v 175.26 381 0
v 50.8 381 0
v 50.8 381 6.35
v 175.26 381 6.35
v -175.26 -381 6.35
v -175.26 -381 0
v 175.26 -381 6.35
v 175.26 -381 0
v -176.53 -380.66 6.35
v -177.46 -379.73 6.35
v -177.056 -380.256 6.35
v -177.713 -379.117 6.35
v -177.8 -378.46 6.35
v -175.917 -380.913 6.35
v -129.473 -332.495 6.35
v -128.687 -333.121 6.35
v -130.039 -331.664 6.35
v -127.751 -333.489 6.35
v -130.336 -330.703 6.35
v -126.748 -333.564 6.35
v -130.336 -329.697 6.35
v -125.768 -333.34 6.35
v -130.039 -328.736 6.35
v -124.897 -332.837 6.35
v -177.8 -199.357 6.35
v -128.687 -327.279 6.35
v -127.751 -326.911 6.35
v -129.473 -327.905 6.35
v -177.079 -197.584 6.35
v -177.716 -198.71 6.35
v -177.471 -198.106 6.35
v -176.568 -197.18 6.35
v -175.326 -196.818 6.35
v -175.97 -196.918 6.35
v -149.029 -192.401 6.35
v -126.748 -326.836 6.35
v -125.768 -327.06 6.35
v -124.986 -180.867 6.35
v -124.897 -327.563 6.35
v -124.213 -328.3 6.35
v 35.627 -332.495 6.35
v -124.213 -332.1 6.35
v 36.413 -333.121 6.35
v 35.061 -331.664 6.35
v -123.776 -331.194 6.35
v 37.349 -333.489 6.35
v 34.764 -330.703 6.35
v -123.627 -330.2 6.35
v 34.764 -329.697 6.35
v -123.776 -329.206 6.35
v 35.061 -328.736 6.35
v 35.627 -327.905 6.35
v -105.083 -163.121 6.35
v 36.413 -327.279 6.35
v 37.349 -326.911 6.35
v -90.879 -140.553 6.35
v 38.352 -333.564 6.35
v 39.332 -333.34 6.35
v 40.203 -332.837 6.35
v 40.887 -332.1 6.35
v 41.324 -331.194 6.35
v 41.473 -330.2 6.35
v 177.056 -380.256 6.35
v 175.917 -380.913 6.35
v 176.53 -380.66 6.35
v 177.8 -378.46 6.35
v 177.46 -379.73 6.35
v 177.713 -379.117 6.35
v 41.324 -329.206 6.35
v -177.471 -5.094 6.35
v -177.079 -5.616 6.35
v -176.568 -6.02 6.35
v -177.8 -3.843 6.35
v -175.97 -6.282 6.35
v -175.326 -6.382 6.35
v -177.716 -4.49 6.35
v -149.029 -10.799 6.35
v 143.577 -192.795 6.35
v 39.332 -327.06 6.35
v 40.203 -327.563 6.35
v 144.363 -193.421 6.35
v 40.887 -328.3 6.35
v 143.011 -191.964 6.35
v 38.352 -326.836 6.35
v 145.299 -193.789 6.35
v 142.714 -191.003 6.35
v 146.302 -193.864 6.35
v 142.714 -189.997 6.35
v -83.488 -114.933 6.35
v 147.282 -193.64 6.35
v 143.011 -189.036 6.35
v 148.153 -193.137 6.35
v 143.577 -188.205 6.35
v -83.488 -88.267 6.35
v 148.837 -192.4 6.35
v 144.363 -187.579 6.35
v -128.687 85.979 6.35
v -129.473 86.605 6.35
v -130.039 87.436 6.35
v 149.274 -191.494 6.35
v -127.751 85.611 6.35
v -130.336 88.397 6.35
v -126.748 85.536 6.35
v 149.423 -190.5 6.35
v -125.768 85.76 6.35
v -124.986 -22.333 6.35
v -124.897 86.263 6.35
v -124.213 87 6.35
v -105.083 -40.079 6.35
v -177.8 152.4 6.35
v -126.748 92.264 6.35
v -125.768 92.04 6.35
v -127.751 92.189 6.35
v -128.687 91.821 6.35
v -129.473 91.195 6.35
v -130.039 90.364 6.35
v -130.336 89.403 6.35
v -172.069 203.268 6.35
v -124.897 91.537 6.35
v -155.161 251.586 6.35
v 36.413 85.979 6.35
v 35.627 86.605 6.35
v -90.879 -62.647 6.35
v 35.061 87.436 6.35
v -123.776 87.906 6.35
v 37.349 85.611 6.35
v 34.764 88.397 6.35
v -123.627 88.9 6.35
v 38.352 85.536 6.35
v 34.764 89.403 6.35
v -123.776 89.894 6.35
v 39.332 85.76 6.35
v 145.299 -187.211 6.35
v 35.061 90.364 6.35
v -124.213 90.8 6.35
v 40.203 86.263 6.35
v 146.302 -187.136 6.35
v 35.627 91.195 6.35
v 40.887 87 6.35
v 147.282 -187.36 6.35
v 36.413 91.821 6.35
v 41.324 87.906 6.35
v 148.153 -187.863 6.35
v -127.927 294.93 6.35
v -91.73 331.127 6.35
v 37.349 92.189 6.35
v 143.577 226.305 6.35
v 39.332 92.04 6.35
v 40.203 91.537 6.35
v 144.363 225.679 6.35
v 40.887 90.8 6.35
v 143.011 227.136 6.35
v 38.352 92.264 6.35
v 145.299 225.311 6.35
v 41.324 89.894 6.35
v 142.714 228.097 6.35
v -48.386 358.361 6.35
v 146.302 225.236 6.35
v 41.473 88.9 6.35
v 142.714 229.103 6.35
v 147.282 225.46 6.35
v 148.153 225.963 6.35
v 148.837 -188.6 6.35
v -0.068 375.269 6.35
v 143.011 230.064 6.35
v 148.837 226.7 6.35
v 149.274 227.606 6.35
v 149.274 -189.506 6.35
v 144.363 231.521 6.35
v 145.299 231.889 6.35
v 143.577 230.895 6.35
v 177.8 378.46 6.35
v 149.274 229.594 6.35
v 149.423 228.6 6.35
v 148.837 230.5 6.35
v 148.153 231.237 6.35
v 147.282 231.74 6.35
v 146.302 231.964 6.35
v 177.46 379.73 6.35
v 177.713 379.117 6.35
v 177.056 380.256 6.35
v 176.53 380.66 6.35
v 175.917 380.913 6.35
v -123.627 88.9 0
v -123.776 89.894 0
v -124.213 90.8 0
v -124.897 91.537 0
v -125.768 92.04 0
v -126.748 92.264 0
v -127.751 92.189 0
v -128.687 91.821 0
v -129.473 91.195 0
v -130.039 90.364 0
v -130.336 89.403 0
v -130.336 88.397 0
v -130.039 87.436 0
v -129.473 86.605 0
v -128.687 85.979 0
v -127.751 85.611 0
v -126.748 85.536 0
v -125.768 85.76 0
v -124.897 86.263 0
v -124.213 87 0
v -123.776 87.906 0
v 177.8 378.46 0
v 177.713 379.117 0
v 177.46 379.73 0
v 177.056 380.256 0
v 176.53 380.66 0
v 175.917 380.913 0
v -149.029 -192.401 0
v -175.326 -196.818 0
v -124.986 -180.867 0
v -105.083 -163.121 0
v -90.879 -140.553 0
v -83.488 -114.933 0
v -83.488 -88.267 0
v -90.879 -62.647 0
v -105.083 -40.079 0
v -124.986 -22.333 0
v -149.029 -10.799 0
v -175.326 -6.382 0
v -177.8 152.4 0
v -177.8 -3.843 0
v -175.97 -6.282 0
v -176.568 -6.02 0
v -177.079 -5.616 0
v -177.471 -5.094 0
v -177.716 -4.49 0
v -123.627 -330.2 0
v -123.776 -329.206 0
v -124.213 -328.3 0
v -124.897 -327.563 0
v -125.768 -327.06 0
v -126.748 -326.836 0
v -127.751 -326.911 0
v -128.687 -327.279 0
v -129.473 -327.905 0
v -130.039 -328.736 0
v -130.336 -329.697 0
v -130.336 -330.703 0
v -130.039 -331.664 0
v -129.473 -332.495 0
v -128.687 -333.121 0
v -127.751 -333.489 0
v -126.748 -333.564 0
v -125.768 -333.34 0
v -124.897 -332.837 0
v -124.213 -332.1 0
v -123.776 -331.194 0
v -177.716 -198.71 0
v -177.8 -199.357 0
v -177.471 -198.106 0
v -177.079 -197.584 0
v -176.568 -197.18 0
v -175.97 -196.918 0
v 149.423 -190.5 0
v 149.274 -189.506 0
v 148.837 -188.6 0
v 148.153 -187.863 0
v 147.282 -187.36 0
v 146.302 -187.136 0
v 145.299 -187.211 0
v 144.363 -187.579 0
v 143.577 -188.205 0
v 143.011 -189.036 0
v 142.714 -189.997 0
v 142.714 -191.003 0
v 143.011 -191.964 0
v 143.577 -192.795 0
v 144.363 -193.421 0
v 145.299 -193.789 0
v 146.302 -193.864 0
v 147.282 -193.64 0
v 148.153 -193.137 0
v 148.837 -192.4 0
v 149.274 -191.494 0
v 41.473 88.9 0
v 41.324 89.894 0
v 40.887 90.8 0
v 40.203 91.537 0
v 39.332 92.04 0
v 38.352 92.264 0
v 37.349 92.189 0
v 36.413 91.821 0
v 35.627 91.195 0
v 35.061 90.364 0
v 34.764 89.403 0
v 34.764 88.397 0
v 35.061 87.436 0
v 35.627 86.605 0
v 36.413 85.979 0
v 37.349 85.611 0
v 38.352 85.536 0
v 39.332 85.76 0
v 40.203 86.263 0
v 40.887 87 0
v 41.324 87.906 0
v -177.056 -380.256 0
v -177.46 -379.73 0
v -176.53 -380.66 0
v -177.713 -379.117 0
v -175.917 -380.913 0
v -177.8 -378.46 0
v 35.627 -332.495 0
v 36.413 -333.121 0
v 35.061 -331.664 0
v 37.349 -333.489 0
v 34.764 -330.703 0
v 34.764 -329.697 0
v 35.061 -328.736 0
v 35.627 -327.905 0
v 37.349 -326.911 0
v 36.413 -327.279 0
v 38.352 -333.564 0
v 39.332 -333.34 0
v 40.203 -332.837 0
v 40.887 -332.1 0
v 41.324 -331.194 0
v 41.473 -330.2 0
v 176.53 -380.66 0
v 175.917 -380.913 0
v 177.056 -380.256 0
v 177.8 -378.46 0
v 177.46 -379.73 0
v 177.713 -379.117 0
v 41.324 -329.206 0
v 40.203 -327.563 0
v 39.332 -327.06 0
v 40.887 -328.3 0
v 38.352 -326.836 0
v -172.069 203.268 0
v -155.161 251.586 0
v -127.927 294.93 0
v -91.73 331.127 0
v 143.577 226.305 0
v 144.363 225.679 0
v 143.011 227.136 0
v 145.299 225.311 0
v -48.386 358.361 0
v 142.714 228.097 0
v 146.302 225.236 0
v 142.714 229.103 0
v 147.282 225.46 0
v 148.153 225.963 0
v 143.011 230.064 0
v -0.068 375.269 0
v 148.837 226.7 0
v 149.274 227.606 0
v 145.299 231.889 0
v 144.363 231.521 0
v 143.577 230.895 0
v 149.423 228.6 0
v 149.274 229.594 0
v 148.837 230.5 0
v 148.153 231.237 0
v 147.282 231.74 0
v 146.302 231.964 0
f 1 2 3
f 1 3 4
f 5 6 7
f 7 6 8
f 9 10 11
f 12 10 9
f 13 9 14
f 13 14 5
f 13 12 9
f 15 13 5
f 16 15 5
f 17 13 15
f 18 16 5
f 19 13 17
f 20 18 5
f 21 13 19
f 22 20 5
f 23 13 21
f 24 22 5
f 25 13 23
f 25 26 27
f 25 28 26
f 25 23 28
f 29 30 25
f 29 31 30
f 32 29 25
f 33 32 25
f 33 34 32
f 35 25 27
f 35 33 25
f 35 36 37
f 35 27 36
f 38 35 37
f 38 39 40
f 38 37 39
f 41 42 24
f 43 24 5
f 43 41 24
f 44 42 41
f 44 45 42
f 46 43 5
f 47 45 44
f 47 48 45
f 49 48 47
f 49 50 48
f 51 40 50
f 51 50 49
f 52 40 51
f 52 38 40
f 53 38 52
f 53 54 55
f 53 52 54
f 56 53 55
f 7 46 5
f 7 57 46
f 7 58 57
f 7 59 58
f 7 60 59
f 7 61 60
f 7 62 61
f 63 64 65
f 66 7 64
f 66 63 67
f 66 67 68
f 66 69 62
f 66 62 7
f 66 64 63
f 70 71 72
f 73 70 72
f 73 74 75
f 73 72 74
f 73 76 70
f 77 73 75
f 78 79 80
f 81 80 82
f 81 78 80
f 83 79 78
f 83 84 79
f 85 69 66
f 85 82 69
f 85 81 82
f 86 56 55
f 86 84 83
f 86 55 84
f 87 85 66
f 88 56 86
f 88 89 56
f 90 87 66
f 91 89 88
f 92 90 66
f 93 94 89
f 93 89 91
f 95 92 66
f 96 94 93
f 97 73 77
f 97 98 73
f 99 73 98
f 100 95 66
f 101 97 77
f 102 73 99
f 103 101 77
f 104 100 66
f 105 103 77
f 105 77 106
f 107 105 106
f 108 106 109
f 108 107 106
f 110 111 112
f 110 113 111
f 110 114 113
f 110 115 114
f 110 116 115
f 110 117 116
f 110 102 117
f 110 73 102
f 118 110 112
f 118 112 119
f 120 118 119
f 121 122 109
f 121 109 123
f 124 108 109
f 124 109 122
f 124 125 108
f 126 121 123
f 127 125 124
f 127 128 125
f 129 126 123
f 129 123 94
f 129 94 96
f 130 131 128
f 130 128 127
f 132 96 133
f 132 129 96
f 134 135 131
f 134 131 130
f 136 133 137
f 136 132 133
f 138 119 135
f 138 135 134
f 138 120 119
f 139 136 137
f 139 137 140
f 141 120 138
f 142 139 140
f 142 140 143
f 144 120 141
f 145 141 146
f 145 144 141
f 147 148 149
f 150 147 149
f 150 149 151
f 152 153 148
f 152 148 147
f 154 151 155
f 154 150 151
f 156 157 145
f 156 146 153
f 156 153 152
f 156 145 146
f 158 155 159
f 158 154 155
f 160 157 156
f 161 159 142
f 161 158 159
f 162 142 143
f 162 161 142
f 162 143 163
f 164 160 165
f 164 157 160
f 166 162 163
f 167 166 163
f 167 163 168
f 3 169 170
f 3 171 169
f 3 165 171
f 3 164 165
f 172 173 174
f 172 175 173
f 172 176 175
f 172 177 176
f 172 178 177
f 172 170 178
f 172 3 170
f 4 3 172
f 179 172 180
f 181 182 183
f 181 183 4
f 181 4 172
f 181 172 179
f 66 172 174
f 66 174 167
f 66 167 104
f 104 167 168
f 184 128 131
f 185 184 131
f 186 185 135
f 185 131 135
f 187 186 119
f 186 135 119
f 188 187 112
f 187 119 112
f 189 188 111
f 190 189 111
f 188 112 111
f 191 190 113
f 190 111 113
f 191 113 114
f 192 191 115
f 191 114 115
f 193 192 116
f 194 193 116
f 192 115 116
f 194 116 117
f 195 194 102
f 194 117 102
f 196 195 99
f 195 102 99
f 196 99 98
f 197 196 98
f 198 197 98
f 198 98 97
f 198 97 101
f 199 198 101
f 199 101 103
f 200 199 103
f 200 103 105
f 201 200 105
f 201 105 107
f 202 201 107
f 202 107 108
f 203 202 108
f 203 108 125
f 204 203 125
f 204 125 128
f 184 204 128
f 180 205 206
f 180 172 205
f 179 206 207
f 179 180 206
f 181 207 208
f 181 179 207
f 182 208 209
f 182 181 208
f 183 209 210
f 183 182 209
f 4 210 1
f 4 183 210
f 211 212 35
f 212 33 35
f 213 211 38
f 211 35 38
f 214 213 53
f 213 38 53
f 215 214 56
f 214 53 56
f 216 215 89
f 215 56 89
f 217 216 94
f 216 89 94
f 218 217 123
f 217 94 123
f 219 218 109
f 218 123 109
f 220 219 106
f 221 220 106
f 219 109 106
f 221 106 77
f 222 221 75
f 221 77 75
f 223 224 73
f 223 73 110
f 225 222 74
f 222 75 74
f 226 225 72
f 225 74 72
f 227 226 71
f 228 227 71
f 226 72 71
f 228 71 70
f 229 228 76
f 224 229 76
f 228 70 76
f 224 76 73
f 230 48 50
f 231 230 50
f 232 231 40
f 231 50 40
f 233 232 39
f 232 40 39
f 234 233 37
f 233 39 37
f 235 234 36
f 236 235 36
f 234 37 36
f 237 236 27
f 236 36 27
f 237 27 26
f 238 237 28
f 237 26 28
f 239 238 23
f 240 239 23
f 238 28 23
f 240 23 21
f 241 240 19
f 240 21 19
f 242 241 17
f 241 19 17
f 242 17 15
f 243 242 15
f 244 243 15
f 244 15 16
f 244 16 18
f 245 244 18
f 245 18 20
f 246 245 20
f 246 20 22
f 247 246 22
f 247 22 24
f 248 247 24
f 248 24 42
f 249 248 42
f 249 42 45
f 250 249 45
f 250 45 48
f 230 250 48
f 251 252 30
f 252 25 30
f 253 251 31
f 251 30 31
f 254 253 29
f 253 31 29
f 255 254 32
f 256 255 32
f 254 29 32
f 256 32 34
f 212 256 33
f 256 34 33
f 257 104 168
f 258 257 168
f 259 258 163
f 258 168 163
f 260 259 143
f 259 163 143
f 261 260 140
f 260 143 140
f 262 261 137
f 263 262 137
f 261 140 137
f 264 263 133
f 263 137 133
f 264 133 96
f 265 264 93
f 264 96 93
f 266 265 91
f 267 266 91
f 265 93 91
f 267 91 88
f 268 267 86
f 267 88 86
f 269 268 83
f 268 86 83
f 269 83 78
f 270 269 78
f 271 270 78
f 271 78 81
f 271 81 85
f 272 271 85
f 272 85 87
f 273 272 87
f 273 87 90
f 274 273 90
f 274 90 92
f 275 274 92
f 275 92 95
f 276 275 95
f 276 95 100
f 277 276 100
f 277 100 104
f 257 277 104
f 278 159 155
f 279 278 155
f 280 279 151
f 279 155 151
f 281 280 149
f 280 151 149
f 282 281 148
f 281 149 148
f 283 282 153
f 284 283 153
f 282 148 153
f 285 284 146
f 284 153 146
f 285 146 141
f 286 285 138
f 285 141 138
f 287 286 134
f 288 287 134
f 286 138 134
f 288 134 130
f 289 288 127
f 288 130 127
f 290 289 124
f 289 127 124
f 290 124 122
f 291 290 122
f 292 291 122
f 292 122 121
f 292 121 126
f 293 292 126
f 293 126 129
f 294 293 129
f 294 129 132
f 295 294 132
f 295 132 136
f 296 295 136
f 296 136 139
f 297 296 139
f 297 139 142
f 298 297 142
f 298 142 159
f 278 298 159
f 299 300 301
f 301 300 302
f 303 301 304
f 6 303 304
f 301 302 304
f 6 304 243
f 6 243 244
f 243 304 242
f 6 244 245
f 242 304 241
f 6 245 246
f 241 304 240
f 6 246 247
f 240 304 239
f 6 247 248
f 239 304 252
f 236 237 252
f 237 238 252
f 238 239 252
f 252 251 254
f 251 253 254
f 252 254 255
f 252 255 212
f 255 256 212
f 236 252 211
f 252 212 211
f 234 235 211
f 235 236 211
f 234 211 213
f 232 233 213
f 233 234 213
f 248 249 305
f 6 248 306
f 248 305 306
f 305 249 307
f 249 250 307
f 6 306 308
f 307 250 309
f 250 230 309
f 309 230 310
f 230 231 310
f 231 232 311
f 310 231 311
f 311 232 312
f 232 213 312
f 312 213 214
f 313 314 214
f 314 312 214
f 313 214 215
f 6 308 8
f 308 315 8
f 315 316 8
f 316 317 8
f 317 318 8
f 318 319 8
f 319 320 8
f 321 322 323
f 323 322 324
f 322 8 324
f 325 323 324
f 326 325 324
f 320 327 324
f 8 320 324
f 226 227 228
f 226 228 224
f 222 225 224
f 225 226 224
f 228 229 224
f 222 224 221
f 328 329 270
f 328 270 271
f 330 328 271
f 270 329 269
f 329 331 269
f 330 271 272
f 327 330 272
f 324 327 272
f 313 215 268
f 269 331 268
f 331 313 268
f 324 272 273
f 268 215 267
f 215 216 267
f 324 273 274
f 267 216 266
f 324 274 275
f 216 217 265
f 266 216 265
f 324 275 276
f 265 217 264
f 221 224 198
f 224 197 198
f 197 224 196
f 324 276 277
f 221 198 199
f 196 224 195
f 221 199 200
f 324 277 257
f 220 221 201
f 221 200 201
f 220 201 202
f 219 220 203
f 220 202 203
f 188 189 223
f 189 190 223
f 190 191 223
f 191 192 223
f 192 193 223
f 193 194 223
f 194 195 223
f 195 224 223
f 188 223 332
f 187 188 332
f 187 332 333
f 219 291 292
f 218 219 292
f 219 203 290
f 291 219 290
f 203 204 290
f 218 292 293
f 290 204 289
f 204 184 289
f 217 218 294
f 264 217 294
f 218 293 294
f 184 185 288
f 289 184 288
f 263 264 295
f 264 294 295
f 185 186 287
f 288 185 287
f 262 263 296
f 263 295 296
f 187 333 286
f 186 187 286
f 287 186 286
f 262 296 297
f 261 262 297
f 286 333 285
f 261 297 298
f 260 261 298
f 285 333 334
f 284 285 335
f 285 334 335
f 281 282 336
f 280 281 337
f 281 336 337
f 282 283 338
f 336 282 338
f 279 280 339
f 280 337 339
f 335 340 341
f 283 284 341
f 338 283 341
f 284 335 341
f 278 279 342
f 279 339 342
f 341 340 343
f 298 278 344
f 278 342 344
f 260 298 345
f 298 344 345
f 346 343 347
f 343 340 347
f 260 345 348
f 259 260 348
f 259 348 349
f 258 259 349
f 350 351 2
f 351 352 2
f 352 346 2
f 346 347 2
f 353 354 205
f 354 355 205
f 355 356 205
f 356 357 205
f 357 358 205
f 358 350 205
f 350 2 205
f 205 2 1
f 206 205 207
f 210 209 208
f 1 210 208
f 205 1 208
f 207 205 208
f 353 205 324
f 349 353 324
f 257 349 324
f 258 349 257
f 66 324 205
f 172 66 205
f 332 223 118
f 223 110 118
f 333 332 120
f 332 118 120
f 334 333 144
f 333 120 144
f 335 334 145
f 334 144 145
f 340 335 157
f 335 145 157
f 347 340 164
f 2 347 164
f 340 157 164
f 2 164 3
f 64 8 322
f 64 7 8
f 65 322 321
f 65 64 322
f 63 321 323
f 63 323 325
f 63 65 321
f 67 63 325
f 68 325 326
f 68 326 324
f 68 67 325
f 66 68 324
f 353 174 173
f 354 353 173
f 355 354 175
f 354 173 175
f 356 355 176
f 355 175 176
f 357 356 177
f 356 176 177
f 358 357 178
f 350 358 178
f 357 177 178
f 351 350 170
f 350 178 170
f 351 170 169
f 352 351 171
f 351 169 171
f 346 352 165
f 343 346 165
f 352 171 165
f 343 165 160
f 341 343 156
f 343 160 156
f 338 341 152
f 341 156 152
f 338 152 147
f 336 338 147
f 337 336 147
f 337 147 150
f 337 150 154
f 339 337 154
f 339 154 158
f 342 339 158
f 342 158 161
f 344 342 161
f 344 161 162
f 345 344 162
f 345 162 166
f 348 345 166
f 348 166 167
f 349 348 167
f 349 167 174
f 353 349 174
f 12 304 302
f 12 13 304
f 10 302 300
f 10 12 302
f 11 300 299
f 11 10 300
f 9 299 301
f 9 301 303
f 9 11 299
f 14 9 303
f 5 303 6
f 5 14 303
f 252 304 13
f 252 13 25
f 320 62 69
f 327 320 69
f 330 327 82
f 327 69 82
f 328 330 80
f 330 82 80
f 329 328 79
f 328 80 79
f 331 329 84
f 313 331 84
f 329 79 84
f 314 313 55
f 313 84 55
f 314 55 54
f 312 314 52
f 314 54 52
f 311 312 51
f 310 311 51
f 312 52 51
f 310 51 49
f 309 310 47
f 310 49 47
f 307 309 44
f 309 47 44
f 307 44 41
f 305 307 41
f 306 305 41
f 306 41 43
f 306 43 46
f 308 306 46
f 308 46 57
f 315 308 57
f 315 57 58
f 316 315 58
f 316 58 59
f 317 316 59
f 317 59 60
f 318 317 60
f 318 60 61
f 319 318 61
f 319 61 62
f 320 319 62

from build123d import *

# Parameters (mm, degrees)
SKETCH1_W           = 355.6
SKETCH1_H           = 762
BOSS_EXTRUDE1_DEPTH = 6.35
FILLET1_R           = 228.6
SKETCH3_R           = 95.25
CUT_EXTRUDE1_DEPTH  = 421.492761531
SKETCH2_R           = 3.3734375
CUT_EXTRUDE2_DEPTH  = 421.492761531
FILLET2_R           = 2.54


with BuildPart() as part:
    # Sketch1 → Boss-Extrude1 (new body)
    with BuildSketch(Plane.XY):
        Rectangle(SKETCH1_W, SKETCH1_H)
    extrude(amount=BOSS_EXTRUDE1_DEPTH)

    # Fillet1
    fillet1_edges = [part.edges().sort_by_distance(p)[0] for p in [
        (-177.8, 381, 3.175),
    ]]
    fillet(fillet1_edges, radius=FILLET1_R)

    # Sketch3 → Cut-Extrude1 (cut, through all)
    with BuildSketch(Plane.XY.offset(6.35)):
        with Locations((-177.8, -101.6)):
            Circle(SKETCH3_R)
    extrude(amount=-CUT_EXTRUDE1_DEPTH, mode=Mode.SUBTRACT)

    # Sketch2 → Cut-Extrude2 (cut, through all)
    with BuildSketch(Plane.XY.offset(6.35)):
        with Locations((146.05, 228.6)):
            Circle(SKETCH2_R)
        with Locations((38.1, 88.9)):
            Circle(SKETCH2_R)
        with Locations((-127, 88.9)):
            Circle(SKETCH2_R)
        with Locations((146.05, -190.5)):
            Circle(SKETCH2_R)
        with Locations((38.1, -330.2)):
            Circle(SKETCH2_R)
        with Locations((-127, -330.2)):
            Circle(SKETCH2_R)
    extrude(amount=-CUT_EXTRUDE2_DEPTH, mode=Mode.SUBTRACT)

    # Fillet2
    fillet2_edges = [part.edges().sort_by_distance(p)[0] for p in [
        (-177.8, -6.35, 3.175),
        (-177.8, -196.85, 3.175),
        (177.8, -381, 3.175),
        (-177.8, -381, 3.175),
        (177.8, 381, 3.175),
    ]]
    fillet(fillet2_edges, radius=FILLET2_R)


solid = part.part
